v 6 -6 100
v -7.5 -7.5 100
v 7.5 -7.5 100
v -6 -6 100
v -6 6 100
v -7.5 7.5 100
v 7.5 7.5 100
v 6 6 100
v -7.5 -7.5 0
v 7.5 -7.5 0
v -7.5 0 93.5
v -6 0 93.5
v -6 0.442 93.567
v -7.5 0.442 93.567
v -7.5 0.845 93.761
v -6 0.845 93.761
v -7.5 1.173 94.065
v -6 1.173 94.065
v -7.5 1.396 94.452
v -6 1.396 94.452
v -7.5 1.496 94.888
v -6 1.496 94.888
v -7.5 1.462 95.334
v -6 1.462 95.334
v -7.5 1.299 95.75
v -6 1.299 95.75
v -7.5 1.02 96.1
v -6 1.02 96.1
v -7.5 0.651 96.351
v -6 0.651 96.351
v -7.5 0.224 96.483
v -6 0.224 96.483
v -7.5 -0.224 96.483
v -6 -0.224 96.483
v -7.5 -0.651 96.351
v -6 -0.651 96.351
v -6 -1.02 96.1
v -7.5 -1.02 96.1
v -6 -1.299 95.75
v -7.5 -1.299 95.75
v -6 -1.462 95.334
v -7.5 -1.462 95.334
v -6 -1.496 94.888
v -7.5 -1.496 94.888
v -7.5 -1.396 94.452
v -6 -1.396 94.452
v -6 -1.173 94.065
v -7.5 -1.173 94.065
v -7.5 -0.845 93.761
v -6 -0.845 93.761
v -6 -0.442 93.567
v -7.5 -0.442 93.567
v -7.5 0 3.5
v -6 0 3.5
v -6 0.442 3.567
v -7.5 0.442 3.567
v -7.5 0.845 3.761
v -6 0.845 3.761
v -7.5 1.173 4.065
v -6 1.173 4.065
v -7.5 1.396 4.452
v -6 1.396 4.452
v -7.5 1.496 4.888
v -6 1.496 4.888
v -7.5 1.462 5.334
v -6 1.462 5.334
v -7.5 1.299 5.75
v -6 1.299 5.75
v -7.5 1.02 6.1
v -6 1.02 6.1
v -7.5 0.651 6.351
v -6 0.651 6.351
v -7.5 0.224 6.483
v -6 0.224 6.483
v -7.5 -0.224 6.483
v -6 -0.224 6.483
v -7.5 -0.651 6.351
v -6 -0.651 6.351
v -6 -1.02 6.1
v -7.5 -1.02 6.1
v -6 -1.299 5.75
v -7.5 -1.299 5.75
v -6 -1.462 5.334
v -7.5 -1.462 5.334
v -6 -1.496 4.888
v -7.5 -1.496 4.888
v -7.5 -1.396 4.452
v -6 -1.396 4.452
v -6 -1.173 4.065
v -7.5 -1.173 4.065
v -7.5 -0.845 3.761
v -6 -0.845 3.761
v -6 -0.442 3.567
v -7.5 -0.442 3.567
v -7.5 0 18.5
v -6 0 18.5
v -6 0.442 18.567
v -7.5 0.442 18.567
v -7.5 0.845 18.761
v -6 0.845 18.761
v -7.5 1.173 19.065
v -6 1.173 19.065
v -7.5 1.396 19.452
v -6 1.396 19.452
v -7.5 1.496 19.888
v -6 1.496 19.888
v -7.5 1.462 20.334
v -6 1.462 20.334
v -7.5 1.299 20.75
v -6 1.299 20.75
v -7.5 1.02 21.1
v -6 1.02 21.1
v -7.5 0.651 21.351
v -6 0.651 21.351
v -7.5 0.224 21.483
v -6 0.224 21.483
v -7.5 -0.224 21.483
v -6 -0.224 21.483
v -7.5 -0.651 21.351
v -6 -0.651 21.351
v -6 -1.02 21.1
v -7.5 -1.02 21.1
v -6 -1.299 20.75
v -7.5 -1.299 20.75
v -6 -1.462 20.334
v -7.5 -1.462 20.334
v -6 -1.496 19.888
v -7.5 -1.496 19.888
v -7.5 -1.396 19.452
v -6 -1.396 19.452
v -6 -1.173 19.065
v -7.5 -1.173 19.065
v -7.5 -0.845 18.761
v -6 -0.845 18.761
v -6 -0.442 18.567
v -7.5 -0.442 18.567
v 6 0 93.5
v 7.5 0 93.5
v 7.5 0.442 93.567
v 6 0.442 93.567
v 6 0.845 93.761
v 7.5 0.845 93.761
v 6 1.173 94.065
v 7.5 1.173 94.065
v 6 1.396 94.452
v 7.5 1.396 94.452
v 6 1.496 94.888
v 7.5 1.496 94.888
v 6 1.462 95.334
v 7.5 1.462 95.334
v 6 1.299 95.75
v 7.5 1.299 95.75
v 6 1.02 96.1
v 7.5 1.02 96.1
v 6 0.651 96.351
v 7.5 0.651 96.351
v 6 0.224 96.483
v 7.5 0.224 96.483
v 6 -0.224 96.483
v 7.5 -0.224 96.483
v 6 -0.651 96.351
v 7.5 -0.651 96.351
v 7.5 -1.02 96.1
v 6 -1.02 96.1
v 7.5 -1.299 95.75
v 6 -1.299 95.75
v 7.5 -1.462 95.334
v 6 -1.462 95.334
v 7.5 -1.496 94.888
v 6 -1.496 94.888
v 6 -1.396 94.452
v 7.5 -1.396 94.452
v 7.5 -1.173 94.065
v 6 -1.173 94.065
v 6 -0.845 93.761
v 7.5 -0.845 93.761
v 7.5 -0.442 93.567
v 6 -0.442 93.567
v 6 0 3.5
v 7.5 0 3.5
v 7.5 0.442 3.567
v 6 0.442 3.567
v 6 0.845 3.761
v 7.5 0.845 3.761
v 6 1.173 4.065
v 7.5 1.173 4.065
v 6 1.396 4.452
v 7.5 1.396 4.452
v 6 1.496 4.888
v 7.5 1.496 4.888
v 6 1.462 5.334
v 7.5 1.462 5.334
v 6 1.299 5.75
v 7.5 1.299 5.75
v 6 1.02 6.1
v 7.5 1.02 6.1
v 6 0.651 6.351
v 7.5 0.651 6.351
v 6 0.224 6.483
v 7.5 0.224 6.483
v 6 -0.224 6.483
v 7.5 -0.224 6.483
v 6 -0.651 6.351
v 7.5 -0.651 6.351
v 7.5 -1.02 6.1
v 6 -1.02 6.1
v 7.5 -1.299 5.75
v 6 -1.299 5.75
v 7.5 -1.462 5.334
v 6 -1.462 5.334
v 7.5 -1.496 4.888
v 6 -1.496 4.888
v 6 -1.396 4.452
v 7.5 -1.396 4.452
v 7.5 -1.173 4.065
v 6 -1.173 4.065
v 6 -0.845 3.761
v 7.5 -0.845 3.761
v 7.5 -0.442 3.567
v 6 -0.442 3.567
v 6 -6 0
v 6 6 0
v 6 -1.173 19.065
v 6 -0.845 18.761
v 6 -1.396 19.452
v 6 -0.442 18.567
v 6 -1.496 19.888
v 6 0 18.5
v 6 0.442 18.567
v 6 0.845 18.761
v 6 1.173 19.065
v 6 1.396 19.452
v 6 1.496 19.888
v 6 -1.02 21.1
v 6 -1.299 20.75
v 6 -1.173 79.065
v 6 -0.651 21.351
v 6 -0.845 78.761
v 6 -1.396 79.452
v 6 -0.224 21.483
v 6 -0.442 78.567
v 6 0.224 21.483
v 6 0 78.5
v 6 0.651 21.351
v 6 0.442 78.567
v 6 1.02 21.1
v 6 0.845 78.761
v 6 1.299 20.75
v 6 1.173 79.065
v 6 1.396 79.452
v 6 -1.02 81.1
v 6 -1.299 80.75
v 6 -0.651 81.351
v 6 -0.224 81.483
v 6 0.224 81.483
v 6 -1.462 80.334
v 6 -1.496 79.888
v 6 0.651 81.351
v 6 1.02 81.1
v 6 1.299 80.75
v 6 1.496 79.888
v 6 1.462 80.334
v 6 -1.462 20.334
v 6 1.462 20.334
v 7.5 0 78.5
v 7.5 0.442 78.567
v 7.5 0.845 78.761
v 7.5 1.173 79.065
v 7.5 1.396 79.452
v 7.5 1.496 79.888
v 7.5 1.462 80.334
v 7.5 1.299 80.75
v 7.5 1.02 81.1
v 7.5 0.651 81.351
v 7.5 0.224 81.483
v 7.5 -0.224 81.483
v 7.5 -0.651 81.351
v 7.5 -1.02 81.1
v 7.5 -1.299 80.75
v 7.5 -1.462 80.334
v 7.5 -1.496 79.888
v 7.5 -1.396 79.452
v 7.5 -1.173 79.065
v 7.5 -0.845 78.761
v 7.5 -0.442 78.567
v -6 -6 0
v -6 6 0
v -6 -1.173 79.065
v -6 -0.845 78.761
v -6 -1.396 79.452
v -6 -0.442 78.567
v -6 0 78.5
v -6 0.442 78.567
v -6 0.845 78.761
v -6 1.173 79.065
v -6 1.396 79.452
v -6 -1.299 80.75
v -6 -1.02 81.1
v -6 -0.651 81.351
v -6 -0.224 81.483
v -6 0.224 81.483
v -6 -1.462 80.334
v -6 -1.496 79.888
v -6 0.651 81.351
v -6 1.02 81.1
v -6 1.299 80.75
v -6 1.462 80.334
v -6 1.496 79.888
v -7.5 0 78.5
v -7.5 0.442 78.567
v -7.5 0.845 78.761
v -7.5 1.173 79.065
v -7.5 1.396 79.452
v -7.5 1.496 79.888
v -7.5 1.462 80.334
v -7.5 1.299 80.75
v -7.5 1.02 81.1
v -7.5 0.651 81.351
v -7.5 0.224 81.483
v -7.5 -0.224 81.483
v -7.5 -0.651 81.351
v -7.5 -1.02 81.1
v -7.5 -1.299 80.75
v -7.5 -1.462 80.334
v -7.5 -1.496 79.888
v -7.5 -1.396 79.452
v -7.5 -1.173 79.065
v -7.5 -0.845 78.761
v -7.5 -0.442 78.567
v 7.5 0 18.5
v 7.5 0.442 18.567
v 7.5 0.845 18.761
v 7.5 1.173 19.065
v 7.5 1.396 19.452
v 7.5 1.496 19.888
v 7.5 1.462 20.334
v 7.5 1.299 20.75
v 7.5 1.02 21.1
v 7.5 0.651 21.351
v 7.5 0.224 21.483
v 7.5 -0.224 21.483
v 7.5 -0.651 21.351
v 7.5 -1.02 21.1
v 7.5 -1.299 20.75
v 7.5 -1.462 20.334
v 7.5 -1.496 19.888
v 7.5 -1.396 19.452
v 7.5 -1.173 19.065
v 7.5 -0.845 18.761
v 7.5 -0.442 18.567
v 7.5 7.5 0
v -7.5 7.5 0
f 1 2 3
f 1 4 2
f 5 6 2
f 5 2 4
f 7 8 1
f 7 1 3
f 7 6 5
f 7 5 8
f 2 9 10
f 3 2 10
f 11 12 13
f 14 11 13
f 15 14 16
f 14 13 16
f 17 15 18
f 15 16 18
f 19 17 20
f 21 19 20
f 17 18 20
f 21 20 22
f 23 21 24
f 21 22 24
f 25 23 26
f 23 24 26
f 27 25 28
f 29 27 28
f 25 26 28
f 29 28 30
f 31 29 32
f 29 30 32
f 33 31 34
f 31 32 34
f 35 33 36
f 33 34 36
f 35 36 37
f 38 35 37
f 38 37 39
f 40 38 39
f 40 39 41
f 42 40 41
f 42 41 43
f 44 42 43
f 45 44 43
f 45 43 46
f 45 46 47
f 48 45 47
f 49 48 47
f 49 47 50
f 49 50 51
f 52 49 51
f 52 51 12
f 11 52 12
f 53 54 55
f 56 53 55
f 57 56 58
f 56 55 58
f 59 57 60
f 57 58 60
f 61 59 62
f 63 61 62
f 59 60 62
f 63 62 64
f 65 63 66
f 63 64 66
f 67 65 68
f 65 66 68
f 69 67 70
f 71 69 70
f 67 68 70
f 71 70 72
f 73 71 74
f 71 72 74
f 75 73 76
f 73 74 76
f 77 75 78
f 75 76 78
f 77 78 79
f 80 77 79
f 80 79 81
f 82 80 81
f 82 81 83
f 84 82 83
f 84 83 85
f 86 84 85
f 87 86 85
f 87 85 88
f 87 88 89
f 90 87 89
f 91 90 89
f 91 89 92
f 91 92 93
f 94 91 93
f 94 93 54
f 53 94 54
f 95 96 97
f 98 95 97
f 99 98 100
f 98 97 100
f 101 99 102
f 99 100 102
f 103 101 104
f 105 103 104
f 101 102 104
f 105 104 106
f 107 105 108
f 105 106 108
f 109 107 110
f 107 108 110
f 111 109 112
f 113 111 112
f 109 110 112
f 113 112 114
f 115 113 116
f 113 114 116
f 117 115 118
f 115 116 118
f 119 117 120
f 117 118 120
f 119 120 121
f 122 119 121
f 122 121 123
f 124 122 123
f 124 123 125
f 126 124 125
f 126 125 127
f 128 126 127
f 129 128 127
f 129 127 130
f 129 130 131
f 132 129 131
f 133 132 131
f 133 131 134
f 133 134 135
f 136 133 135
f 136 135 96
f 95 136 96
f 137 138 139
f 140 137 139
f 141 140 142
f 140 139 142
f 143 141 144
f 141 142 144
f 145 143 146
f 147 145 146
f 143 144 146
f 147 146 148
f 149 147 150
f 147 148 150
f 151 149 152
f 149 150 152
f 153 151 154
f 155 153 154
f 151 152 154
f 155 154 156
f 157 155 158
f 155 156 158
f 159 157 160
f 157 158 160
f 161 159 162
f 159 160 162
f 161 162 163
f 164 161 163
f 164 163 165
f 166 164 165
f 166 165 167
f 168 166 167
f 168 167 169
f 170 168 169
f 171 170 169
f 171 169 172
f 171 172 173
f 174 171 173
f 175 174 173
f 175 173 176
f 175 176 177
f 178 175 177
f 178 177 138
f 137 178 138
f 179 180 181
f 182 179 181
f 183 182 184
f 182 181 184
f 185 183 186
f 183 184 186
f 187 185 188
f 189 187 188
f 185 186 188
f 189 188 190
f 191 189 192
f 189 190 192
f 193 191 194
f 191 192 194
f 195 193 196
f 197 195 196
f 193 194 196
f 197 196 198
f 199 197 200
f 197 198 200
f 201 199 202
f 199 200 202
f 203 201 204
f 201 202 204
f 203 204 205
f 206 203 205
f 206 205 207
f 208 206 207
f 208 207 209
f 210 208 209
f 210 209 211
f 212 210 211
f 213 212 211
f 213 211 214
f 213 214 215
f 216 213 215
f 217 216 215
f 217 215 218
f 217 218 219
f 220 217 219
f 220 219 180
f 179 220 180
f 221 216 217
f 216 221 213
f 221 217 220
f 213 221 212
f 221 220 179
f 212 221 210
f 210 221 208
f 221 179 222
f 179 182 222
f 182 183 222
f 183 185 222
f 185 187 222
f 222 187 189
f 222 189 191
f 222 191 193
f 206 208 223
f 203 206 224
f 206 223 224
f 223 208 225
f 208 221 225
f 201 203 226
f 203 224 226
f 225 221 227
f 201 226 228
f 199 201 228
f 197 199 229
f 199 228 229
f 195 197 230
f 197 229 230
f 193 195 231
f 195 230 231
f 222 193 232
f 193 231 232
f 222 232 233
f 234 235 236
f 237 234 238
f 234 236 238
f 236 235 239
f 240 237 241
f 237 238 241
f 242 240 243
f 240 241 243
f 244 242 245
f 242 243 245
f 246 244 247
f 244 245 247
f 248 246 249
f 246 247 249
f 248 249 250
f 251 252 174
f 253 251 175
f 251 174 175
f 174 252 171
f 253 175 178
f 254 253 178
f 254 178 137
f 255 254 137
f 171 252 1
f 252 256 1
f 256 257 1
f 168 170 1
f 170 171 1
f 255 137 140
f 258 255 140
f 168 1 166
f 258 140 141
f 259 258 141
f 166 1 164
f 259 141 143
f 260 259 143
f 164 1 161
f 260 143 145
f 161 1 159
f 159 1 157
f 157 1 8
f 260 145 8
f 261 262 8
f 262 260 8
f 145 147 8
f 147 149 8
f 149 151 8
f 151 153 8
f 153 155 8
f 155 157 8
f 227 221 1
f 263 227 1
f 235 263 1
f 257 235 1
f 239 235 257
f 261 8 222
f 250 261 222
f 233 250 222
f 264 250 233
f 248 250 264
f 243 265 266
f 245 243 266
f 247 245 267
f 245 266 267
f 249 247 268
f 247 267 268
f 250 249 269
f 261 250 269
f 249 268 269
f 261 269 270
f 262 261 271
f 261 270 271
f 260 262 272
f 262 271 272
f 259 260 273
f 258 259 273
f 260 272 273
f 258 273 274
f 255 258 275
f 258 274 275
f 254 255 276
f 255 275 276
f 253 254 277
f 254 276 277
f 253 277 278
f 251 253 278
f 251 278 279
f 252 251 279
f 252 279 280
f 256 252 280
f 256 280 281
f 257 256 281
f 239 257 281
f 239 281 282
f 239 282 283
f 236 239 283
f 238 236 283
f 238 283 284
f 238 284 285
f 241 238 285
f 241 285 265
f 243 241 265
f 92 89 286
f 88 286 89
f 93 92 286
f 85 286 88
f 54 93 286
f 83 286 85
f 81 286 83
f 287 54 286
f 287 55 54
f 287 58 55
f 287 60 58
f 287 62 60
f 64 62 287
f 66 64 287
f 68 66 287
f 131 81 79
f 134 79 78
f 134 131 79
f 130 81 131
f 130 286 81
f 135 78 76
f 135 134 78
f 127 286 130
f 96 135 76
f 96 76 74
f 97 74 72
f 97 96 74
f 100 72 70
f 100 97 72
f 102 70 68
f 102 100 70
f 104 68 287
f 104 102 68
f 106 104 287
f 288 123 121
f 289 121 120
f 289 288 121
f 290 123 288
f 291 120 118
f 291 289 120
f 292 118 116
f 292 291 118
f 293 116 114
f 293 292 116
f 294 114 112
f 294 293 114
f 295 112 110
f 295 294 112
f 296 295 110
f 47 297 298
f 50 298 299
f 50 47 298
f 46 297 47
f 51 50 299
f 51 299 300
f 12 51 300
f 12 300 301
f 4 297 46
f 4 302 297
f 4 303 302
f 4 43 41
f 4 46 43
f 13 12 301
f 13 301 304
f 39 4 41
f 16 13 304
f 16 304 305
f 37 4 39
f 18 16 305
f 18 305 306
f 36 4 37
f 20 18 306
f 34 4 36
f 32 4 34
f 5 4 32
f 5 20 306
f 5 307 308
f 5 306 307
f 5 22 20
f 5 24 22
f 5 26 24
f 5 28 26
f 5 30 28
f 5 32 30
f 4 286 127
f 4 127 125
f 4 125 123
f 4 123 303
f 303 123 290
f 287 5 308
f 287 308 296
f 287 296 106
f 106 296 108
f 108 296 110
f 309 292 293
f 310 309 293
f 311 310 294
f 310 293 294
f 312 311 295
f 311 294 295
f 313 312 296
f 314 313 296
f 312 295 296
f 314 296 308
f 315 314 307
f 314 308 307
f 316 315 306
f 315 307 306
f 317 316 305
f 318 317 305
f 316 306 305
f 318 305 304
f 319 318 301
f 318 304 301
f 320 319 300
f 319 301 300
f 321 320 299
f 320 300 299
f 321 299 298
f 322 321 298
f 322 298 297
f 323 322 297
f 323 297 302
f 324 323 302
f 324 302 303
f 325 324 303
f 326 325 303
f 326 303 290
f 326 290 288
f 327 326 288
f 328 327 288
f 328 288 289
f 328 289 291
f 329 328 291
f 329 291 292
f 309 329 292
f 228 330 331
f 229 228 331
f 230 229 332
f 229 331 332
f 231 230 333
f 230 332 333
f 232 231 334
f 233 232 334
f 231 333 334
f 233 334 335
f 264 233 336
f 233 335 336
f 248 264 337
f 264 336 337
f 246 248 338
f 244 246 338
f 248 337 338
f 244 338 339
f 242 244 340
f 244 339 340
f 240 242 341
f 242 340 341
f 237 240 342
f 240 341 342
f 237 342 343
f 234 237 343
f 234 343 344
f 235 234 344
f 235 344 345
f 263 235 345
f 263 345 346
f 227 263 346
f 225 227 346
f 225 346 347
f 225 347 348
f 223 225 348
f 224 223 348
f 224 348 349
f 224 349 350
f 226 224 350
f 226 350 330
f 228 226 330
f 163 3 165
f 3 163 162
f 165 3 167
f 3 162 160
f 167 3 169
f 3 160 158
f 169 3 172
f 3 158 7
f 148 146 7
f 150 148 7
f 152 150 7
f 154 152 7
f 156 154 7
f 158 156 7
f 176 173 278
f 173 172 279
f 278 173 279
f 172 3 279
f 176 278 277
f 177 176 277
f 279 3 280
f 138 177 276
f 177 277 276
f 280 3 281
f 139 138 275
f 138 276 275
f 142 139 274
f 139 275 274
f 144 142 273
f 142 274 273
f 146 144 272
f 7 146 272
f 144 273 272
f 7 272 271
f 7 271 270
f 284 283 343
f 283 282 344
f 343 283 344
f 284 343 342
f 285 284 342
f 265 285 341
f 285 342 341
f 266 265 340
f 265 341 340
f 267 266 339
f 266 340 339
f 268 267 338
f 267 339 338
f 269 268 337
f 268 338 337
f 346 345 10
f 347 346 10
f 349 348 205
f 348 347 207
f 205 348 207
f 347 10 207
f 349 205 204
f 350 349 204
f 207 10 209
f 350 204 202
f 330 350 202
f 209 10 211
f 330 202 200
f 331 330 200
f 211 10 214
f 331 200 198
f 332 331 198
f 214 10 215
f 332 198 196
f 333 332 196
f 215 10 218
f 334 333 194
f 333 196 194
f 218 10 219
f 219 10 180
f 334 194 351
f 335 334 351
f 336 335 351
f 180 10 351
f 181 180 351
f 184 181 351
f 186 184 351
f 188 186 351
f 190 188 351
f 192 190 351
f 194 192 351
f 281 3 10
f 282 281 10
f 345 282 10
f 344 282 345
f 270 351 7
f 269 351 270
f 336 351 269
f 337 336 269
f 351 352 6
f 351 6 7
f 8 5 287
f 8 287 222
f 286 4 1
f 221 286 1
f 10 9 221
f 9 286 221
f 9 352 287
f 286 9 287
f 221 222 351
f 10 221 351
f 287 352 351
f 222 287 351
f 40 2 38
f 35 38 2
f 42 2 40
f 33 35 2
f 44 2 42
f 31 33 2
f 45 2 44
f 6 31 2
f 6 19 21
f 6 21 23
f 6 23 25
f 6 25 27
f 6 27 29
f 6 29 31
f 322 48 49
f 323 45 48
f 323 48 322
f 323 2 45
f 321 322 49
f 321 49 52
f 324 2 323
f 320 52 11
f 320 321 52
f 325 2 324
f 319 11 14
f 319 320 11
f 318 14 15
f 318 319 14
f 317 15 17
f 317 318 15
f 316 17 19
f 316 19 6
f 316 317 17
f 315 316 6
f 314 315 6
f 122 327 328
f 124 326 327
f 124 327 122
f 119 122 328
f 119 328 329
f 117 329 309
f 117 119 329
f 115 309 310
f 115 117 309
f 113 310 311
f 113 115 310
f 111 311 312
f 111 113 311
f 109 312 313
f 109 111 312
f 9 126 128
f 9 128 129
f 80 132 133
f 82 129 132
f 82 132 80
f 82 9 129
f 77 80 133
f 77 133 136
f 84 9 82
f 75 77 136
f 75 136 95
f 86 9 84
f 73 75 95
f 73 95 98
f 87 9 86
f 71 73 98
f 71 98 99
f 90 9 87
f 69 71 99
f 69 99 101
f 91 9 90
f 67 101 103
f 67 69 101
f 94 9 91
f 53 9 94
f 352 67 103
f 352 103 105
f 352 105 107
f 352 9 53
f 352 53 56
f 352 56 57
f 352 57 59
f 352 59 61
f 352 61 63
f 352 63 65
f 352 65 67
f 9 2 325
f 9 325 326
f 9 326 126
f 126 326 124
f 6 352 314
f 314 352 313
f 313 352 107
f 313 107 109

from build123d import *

# Parameters (mm, degrees)
ESQUISSE1_W             = 15
ESQUISSE1_H             = 15
EXTRUSION1_DEPTH        = 100
ESQUISSE2_W             = 12
ESQUISSE2_H             = 12
EXTRUSION2_DEPTH        = 101.560926806
ESQUISSE3_R             = 1.5
ENL_V_MAT_EXTRU_1_DEPTH = 102.396498953
ESQUISSE4_R             = 1.5
ENL_V_MAT_EXTRU_2_DEPTH = 102.396498953
ESQUISSE5_R             = 1.5
ENL_V_MAT_EXTRU_3_DEPTH = 102.396498953


with BuildPart() as part:
    # Esquisse1 → Extrusion1 (new body)
    with BuildSketch(Plane.XY):
        Rectangle(ESQUISSE1_W, ESQUISSE1_H)
    extrude(amount=EXTRUSION1_DEPTH)

    # Esquisse2 → Extrusion2 (cut, through all)
    with BuildSketch(Plane.XY.offset(100)):
        Rectangle(ESQUISSE2_W, ESQUISSE2_H)
    extrude(amount=-EXTRUSION2_DEPTH, mode=Mode.SUBTRACT)

    # Esquisse3 → Enlèv. mat.-Extru.1 (cut, through all)
    with BuildSketch(Plane(origin=(7.5, 0, 0), x_dir=(0, 0, -1), z_dir=(1, 0, 0))):
        with Locations((-5, 0)):
            Circle(ESQUISSE3_R)
    extrude(amount=-ENL_V_MAT_EXTRU_1_DEPTH, mode=Mode.SUBTRACT)

    # Esquisse4 → Enlèv. mat.-Extru.2 (cut, through all)
    with BuildSketch(Plane(origin=(7.5, 0, 0), x_dir=(0, 0, -1), z_dir=(1, 0, 0))):
        with Locations((-20, 0)):
            Circle(ESQUISSE4_R)
    extrude(amount=-ENL_V_MAT_EXTRU_2_DEPTH, mode=Mode.SUBTRACT)

    # Esquisse5 → Enlèv. mat.-Extru.3 (cut, through all)
    with BuildSketch(Plane(origin=(7.5, 0, 0), x_dir=(0, 0, -1), z_dir=(1, 0, 0))):
        with Locations((-95, 0)):
            Circle(ESQUISSE5_R)
        with Locations((-80, 0)):
            Circle(ESQUISSE5_R)
    extrude(amount=-ENL_V_MAT_EXTRU_3_DEPTH, mode=Mode.SUBTRACT)


solid = part.part
